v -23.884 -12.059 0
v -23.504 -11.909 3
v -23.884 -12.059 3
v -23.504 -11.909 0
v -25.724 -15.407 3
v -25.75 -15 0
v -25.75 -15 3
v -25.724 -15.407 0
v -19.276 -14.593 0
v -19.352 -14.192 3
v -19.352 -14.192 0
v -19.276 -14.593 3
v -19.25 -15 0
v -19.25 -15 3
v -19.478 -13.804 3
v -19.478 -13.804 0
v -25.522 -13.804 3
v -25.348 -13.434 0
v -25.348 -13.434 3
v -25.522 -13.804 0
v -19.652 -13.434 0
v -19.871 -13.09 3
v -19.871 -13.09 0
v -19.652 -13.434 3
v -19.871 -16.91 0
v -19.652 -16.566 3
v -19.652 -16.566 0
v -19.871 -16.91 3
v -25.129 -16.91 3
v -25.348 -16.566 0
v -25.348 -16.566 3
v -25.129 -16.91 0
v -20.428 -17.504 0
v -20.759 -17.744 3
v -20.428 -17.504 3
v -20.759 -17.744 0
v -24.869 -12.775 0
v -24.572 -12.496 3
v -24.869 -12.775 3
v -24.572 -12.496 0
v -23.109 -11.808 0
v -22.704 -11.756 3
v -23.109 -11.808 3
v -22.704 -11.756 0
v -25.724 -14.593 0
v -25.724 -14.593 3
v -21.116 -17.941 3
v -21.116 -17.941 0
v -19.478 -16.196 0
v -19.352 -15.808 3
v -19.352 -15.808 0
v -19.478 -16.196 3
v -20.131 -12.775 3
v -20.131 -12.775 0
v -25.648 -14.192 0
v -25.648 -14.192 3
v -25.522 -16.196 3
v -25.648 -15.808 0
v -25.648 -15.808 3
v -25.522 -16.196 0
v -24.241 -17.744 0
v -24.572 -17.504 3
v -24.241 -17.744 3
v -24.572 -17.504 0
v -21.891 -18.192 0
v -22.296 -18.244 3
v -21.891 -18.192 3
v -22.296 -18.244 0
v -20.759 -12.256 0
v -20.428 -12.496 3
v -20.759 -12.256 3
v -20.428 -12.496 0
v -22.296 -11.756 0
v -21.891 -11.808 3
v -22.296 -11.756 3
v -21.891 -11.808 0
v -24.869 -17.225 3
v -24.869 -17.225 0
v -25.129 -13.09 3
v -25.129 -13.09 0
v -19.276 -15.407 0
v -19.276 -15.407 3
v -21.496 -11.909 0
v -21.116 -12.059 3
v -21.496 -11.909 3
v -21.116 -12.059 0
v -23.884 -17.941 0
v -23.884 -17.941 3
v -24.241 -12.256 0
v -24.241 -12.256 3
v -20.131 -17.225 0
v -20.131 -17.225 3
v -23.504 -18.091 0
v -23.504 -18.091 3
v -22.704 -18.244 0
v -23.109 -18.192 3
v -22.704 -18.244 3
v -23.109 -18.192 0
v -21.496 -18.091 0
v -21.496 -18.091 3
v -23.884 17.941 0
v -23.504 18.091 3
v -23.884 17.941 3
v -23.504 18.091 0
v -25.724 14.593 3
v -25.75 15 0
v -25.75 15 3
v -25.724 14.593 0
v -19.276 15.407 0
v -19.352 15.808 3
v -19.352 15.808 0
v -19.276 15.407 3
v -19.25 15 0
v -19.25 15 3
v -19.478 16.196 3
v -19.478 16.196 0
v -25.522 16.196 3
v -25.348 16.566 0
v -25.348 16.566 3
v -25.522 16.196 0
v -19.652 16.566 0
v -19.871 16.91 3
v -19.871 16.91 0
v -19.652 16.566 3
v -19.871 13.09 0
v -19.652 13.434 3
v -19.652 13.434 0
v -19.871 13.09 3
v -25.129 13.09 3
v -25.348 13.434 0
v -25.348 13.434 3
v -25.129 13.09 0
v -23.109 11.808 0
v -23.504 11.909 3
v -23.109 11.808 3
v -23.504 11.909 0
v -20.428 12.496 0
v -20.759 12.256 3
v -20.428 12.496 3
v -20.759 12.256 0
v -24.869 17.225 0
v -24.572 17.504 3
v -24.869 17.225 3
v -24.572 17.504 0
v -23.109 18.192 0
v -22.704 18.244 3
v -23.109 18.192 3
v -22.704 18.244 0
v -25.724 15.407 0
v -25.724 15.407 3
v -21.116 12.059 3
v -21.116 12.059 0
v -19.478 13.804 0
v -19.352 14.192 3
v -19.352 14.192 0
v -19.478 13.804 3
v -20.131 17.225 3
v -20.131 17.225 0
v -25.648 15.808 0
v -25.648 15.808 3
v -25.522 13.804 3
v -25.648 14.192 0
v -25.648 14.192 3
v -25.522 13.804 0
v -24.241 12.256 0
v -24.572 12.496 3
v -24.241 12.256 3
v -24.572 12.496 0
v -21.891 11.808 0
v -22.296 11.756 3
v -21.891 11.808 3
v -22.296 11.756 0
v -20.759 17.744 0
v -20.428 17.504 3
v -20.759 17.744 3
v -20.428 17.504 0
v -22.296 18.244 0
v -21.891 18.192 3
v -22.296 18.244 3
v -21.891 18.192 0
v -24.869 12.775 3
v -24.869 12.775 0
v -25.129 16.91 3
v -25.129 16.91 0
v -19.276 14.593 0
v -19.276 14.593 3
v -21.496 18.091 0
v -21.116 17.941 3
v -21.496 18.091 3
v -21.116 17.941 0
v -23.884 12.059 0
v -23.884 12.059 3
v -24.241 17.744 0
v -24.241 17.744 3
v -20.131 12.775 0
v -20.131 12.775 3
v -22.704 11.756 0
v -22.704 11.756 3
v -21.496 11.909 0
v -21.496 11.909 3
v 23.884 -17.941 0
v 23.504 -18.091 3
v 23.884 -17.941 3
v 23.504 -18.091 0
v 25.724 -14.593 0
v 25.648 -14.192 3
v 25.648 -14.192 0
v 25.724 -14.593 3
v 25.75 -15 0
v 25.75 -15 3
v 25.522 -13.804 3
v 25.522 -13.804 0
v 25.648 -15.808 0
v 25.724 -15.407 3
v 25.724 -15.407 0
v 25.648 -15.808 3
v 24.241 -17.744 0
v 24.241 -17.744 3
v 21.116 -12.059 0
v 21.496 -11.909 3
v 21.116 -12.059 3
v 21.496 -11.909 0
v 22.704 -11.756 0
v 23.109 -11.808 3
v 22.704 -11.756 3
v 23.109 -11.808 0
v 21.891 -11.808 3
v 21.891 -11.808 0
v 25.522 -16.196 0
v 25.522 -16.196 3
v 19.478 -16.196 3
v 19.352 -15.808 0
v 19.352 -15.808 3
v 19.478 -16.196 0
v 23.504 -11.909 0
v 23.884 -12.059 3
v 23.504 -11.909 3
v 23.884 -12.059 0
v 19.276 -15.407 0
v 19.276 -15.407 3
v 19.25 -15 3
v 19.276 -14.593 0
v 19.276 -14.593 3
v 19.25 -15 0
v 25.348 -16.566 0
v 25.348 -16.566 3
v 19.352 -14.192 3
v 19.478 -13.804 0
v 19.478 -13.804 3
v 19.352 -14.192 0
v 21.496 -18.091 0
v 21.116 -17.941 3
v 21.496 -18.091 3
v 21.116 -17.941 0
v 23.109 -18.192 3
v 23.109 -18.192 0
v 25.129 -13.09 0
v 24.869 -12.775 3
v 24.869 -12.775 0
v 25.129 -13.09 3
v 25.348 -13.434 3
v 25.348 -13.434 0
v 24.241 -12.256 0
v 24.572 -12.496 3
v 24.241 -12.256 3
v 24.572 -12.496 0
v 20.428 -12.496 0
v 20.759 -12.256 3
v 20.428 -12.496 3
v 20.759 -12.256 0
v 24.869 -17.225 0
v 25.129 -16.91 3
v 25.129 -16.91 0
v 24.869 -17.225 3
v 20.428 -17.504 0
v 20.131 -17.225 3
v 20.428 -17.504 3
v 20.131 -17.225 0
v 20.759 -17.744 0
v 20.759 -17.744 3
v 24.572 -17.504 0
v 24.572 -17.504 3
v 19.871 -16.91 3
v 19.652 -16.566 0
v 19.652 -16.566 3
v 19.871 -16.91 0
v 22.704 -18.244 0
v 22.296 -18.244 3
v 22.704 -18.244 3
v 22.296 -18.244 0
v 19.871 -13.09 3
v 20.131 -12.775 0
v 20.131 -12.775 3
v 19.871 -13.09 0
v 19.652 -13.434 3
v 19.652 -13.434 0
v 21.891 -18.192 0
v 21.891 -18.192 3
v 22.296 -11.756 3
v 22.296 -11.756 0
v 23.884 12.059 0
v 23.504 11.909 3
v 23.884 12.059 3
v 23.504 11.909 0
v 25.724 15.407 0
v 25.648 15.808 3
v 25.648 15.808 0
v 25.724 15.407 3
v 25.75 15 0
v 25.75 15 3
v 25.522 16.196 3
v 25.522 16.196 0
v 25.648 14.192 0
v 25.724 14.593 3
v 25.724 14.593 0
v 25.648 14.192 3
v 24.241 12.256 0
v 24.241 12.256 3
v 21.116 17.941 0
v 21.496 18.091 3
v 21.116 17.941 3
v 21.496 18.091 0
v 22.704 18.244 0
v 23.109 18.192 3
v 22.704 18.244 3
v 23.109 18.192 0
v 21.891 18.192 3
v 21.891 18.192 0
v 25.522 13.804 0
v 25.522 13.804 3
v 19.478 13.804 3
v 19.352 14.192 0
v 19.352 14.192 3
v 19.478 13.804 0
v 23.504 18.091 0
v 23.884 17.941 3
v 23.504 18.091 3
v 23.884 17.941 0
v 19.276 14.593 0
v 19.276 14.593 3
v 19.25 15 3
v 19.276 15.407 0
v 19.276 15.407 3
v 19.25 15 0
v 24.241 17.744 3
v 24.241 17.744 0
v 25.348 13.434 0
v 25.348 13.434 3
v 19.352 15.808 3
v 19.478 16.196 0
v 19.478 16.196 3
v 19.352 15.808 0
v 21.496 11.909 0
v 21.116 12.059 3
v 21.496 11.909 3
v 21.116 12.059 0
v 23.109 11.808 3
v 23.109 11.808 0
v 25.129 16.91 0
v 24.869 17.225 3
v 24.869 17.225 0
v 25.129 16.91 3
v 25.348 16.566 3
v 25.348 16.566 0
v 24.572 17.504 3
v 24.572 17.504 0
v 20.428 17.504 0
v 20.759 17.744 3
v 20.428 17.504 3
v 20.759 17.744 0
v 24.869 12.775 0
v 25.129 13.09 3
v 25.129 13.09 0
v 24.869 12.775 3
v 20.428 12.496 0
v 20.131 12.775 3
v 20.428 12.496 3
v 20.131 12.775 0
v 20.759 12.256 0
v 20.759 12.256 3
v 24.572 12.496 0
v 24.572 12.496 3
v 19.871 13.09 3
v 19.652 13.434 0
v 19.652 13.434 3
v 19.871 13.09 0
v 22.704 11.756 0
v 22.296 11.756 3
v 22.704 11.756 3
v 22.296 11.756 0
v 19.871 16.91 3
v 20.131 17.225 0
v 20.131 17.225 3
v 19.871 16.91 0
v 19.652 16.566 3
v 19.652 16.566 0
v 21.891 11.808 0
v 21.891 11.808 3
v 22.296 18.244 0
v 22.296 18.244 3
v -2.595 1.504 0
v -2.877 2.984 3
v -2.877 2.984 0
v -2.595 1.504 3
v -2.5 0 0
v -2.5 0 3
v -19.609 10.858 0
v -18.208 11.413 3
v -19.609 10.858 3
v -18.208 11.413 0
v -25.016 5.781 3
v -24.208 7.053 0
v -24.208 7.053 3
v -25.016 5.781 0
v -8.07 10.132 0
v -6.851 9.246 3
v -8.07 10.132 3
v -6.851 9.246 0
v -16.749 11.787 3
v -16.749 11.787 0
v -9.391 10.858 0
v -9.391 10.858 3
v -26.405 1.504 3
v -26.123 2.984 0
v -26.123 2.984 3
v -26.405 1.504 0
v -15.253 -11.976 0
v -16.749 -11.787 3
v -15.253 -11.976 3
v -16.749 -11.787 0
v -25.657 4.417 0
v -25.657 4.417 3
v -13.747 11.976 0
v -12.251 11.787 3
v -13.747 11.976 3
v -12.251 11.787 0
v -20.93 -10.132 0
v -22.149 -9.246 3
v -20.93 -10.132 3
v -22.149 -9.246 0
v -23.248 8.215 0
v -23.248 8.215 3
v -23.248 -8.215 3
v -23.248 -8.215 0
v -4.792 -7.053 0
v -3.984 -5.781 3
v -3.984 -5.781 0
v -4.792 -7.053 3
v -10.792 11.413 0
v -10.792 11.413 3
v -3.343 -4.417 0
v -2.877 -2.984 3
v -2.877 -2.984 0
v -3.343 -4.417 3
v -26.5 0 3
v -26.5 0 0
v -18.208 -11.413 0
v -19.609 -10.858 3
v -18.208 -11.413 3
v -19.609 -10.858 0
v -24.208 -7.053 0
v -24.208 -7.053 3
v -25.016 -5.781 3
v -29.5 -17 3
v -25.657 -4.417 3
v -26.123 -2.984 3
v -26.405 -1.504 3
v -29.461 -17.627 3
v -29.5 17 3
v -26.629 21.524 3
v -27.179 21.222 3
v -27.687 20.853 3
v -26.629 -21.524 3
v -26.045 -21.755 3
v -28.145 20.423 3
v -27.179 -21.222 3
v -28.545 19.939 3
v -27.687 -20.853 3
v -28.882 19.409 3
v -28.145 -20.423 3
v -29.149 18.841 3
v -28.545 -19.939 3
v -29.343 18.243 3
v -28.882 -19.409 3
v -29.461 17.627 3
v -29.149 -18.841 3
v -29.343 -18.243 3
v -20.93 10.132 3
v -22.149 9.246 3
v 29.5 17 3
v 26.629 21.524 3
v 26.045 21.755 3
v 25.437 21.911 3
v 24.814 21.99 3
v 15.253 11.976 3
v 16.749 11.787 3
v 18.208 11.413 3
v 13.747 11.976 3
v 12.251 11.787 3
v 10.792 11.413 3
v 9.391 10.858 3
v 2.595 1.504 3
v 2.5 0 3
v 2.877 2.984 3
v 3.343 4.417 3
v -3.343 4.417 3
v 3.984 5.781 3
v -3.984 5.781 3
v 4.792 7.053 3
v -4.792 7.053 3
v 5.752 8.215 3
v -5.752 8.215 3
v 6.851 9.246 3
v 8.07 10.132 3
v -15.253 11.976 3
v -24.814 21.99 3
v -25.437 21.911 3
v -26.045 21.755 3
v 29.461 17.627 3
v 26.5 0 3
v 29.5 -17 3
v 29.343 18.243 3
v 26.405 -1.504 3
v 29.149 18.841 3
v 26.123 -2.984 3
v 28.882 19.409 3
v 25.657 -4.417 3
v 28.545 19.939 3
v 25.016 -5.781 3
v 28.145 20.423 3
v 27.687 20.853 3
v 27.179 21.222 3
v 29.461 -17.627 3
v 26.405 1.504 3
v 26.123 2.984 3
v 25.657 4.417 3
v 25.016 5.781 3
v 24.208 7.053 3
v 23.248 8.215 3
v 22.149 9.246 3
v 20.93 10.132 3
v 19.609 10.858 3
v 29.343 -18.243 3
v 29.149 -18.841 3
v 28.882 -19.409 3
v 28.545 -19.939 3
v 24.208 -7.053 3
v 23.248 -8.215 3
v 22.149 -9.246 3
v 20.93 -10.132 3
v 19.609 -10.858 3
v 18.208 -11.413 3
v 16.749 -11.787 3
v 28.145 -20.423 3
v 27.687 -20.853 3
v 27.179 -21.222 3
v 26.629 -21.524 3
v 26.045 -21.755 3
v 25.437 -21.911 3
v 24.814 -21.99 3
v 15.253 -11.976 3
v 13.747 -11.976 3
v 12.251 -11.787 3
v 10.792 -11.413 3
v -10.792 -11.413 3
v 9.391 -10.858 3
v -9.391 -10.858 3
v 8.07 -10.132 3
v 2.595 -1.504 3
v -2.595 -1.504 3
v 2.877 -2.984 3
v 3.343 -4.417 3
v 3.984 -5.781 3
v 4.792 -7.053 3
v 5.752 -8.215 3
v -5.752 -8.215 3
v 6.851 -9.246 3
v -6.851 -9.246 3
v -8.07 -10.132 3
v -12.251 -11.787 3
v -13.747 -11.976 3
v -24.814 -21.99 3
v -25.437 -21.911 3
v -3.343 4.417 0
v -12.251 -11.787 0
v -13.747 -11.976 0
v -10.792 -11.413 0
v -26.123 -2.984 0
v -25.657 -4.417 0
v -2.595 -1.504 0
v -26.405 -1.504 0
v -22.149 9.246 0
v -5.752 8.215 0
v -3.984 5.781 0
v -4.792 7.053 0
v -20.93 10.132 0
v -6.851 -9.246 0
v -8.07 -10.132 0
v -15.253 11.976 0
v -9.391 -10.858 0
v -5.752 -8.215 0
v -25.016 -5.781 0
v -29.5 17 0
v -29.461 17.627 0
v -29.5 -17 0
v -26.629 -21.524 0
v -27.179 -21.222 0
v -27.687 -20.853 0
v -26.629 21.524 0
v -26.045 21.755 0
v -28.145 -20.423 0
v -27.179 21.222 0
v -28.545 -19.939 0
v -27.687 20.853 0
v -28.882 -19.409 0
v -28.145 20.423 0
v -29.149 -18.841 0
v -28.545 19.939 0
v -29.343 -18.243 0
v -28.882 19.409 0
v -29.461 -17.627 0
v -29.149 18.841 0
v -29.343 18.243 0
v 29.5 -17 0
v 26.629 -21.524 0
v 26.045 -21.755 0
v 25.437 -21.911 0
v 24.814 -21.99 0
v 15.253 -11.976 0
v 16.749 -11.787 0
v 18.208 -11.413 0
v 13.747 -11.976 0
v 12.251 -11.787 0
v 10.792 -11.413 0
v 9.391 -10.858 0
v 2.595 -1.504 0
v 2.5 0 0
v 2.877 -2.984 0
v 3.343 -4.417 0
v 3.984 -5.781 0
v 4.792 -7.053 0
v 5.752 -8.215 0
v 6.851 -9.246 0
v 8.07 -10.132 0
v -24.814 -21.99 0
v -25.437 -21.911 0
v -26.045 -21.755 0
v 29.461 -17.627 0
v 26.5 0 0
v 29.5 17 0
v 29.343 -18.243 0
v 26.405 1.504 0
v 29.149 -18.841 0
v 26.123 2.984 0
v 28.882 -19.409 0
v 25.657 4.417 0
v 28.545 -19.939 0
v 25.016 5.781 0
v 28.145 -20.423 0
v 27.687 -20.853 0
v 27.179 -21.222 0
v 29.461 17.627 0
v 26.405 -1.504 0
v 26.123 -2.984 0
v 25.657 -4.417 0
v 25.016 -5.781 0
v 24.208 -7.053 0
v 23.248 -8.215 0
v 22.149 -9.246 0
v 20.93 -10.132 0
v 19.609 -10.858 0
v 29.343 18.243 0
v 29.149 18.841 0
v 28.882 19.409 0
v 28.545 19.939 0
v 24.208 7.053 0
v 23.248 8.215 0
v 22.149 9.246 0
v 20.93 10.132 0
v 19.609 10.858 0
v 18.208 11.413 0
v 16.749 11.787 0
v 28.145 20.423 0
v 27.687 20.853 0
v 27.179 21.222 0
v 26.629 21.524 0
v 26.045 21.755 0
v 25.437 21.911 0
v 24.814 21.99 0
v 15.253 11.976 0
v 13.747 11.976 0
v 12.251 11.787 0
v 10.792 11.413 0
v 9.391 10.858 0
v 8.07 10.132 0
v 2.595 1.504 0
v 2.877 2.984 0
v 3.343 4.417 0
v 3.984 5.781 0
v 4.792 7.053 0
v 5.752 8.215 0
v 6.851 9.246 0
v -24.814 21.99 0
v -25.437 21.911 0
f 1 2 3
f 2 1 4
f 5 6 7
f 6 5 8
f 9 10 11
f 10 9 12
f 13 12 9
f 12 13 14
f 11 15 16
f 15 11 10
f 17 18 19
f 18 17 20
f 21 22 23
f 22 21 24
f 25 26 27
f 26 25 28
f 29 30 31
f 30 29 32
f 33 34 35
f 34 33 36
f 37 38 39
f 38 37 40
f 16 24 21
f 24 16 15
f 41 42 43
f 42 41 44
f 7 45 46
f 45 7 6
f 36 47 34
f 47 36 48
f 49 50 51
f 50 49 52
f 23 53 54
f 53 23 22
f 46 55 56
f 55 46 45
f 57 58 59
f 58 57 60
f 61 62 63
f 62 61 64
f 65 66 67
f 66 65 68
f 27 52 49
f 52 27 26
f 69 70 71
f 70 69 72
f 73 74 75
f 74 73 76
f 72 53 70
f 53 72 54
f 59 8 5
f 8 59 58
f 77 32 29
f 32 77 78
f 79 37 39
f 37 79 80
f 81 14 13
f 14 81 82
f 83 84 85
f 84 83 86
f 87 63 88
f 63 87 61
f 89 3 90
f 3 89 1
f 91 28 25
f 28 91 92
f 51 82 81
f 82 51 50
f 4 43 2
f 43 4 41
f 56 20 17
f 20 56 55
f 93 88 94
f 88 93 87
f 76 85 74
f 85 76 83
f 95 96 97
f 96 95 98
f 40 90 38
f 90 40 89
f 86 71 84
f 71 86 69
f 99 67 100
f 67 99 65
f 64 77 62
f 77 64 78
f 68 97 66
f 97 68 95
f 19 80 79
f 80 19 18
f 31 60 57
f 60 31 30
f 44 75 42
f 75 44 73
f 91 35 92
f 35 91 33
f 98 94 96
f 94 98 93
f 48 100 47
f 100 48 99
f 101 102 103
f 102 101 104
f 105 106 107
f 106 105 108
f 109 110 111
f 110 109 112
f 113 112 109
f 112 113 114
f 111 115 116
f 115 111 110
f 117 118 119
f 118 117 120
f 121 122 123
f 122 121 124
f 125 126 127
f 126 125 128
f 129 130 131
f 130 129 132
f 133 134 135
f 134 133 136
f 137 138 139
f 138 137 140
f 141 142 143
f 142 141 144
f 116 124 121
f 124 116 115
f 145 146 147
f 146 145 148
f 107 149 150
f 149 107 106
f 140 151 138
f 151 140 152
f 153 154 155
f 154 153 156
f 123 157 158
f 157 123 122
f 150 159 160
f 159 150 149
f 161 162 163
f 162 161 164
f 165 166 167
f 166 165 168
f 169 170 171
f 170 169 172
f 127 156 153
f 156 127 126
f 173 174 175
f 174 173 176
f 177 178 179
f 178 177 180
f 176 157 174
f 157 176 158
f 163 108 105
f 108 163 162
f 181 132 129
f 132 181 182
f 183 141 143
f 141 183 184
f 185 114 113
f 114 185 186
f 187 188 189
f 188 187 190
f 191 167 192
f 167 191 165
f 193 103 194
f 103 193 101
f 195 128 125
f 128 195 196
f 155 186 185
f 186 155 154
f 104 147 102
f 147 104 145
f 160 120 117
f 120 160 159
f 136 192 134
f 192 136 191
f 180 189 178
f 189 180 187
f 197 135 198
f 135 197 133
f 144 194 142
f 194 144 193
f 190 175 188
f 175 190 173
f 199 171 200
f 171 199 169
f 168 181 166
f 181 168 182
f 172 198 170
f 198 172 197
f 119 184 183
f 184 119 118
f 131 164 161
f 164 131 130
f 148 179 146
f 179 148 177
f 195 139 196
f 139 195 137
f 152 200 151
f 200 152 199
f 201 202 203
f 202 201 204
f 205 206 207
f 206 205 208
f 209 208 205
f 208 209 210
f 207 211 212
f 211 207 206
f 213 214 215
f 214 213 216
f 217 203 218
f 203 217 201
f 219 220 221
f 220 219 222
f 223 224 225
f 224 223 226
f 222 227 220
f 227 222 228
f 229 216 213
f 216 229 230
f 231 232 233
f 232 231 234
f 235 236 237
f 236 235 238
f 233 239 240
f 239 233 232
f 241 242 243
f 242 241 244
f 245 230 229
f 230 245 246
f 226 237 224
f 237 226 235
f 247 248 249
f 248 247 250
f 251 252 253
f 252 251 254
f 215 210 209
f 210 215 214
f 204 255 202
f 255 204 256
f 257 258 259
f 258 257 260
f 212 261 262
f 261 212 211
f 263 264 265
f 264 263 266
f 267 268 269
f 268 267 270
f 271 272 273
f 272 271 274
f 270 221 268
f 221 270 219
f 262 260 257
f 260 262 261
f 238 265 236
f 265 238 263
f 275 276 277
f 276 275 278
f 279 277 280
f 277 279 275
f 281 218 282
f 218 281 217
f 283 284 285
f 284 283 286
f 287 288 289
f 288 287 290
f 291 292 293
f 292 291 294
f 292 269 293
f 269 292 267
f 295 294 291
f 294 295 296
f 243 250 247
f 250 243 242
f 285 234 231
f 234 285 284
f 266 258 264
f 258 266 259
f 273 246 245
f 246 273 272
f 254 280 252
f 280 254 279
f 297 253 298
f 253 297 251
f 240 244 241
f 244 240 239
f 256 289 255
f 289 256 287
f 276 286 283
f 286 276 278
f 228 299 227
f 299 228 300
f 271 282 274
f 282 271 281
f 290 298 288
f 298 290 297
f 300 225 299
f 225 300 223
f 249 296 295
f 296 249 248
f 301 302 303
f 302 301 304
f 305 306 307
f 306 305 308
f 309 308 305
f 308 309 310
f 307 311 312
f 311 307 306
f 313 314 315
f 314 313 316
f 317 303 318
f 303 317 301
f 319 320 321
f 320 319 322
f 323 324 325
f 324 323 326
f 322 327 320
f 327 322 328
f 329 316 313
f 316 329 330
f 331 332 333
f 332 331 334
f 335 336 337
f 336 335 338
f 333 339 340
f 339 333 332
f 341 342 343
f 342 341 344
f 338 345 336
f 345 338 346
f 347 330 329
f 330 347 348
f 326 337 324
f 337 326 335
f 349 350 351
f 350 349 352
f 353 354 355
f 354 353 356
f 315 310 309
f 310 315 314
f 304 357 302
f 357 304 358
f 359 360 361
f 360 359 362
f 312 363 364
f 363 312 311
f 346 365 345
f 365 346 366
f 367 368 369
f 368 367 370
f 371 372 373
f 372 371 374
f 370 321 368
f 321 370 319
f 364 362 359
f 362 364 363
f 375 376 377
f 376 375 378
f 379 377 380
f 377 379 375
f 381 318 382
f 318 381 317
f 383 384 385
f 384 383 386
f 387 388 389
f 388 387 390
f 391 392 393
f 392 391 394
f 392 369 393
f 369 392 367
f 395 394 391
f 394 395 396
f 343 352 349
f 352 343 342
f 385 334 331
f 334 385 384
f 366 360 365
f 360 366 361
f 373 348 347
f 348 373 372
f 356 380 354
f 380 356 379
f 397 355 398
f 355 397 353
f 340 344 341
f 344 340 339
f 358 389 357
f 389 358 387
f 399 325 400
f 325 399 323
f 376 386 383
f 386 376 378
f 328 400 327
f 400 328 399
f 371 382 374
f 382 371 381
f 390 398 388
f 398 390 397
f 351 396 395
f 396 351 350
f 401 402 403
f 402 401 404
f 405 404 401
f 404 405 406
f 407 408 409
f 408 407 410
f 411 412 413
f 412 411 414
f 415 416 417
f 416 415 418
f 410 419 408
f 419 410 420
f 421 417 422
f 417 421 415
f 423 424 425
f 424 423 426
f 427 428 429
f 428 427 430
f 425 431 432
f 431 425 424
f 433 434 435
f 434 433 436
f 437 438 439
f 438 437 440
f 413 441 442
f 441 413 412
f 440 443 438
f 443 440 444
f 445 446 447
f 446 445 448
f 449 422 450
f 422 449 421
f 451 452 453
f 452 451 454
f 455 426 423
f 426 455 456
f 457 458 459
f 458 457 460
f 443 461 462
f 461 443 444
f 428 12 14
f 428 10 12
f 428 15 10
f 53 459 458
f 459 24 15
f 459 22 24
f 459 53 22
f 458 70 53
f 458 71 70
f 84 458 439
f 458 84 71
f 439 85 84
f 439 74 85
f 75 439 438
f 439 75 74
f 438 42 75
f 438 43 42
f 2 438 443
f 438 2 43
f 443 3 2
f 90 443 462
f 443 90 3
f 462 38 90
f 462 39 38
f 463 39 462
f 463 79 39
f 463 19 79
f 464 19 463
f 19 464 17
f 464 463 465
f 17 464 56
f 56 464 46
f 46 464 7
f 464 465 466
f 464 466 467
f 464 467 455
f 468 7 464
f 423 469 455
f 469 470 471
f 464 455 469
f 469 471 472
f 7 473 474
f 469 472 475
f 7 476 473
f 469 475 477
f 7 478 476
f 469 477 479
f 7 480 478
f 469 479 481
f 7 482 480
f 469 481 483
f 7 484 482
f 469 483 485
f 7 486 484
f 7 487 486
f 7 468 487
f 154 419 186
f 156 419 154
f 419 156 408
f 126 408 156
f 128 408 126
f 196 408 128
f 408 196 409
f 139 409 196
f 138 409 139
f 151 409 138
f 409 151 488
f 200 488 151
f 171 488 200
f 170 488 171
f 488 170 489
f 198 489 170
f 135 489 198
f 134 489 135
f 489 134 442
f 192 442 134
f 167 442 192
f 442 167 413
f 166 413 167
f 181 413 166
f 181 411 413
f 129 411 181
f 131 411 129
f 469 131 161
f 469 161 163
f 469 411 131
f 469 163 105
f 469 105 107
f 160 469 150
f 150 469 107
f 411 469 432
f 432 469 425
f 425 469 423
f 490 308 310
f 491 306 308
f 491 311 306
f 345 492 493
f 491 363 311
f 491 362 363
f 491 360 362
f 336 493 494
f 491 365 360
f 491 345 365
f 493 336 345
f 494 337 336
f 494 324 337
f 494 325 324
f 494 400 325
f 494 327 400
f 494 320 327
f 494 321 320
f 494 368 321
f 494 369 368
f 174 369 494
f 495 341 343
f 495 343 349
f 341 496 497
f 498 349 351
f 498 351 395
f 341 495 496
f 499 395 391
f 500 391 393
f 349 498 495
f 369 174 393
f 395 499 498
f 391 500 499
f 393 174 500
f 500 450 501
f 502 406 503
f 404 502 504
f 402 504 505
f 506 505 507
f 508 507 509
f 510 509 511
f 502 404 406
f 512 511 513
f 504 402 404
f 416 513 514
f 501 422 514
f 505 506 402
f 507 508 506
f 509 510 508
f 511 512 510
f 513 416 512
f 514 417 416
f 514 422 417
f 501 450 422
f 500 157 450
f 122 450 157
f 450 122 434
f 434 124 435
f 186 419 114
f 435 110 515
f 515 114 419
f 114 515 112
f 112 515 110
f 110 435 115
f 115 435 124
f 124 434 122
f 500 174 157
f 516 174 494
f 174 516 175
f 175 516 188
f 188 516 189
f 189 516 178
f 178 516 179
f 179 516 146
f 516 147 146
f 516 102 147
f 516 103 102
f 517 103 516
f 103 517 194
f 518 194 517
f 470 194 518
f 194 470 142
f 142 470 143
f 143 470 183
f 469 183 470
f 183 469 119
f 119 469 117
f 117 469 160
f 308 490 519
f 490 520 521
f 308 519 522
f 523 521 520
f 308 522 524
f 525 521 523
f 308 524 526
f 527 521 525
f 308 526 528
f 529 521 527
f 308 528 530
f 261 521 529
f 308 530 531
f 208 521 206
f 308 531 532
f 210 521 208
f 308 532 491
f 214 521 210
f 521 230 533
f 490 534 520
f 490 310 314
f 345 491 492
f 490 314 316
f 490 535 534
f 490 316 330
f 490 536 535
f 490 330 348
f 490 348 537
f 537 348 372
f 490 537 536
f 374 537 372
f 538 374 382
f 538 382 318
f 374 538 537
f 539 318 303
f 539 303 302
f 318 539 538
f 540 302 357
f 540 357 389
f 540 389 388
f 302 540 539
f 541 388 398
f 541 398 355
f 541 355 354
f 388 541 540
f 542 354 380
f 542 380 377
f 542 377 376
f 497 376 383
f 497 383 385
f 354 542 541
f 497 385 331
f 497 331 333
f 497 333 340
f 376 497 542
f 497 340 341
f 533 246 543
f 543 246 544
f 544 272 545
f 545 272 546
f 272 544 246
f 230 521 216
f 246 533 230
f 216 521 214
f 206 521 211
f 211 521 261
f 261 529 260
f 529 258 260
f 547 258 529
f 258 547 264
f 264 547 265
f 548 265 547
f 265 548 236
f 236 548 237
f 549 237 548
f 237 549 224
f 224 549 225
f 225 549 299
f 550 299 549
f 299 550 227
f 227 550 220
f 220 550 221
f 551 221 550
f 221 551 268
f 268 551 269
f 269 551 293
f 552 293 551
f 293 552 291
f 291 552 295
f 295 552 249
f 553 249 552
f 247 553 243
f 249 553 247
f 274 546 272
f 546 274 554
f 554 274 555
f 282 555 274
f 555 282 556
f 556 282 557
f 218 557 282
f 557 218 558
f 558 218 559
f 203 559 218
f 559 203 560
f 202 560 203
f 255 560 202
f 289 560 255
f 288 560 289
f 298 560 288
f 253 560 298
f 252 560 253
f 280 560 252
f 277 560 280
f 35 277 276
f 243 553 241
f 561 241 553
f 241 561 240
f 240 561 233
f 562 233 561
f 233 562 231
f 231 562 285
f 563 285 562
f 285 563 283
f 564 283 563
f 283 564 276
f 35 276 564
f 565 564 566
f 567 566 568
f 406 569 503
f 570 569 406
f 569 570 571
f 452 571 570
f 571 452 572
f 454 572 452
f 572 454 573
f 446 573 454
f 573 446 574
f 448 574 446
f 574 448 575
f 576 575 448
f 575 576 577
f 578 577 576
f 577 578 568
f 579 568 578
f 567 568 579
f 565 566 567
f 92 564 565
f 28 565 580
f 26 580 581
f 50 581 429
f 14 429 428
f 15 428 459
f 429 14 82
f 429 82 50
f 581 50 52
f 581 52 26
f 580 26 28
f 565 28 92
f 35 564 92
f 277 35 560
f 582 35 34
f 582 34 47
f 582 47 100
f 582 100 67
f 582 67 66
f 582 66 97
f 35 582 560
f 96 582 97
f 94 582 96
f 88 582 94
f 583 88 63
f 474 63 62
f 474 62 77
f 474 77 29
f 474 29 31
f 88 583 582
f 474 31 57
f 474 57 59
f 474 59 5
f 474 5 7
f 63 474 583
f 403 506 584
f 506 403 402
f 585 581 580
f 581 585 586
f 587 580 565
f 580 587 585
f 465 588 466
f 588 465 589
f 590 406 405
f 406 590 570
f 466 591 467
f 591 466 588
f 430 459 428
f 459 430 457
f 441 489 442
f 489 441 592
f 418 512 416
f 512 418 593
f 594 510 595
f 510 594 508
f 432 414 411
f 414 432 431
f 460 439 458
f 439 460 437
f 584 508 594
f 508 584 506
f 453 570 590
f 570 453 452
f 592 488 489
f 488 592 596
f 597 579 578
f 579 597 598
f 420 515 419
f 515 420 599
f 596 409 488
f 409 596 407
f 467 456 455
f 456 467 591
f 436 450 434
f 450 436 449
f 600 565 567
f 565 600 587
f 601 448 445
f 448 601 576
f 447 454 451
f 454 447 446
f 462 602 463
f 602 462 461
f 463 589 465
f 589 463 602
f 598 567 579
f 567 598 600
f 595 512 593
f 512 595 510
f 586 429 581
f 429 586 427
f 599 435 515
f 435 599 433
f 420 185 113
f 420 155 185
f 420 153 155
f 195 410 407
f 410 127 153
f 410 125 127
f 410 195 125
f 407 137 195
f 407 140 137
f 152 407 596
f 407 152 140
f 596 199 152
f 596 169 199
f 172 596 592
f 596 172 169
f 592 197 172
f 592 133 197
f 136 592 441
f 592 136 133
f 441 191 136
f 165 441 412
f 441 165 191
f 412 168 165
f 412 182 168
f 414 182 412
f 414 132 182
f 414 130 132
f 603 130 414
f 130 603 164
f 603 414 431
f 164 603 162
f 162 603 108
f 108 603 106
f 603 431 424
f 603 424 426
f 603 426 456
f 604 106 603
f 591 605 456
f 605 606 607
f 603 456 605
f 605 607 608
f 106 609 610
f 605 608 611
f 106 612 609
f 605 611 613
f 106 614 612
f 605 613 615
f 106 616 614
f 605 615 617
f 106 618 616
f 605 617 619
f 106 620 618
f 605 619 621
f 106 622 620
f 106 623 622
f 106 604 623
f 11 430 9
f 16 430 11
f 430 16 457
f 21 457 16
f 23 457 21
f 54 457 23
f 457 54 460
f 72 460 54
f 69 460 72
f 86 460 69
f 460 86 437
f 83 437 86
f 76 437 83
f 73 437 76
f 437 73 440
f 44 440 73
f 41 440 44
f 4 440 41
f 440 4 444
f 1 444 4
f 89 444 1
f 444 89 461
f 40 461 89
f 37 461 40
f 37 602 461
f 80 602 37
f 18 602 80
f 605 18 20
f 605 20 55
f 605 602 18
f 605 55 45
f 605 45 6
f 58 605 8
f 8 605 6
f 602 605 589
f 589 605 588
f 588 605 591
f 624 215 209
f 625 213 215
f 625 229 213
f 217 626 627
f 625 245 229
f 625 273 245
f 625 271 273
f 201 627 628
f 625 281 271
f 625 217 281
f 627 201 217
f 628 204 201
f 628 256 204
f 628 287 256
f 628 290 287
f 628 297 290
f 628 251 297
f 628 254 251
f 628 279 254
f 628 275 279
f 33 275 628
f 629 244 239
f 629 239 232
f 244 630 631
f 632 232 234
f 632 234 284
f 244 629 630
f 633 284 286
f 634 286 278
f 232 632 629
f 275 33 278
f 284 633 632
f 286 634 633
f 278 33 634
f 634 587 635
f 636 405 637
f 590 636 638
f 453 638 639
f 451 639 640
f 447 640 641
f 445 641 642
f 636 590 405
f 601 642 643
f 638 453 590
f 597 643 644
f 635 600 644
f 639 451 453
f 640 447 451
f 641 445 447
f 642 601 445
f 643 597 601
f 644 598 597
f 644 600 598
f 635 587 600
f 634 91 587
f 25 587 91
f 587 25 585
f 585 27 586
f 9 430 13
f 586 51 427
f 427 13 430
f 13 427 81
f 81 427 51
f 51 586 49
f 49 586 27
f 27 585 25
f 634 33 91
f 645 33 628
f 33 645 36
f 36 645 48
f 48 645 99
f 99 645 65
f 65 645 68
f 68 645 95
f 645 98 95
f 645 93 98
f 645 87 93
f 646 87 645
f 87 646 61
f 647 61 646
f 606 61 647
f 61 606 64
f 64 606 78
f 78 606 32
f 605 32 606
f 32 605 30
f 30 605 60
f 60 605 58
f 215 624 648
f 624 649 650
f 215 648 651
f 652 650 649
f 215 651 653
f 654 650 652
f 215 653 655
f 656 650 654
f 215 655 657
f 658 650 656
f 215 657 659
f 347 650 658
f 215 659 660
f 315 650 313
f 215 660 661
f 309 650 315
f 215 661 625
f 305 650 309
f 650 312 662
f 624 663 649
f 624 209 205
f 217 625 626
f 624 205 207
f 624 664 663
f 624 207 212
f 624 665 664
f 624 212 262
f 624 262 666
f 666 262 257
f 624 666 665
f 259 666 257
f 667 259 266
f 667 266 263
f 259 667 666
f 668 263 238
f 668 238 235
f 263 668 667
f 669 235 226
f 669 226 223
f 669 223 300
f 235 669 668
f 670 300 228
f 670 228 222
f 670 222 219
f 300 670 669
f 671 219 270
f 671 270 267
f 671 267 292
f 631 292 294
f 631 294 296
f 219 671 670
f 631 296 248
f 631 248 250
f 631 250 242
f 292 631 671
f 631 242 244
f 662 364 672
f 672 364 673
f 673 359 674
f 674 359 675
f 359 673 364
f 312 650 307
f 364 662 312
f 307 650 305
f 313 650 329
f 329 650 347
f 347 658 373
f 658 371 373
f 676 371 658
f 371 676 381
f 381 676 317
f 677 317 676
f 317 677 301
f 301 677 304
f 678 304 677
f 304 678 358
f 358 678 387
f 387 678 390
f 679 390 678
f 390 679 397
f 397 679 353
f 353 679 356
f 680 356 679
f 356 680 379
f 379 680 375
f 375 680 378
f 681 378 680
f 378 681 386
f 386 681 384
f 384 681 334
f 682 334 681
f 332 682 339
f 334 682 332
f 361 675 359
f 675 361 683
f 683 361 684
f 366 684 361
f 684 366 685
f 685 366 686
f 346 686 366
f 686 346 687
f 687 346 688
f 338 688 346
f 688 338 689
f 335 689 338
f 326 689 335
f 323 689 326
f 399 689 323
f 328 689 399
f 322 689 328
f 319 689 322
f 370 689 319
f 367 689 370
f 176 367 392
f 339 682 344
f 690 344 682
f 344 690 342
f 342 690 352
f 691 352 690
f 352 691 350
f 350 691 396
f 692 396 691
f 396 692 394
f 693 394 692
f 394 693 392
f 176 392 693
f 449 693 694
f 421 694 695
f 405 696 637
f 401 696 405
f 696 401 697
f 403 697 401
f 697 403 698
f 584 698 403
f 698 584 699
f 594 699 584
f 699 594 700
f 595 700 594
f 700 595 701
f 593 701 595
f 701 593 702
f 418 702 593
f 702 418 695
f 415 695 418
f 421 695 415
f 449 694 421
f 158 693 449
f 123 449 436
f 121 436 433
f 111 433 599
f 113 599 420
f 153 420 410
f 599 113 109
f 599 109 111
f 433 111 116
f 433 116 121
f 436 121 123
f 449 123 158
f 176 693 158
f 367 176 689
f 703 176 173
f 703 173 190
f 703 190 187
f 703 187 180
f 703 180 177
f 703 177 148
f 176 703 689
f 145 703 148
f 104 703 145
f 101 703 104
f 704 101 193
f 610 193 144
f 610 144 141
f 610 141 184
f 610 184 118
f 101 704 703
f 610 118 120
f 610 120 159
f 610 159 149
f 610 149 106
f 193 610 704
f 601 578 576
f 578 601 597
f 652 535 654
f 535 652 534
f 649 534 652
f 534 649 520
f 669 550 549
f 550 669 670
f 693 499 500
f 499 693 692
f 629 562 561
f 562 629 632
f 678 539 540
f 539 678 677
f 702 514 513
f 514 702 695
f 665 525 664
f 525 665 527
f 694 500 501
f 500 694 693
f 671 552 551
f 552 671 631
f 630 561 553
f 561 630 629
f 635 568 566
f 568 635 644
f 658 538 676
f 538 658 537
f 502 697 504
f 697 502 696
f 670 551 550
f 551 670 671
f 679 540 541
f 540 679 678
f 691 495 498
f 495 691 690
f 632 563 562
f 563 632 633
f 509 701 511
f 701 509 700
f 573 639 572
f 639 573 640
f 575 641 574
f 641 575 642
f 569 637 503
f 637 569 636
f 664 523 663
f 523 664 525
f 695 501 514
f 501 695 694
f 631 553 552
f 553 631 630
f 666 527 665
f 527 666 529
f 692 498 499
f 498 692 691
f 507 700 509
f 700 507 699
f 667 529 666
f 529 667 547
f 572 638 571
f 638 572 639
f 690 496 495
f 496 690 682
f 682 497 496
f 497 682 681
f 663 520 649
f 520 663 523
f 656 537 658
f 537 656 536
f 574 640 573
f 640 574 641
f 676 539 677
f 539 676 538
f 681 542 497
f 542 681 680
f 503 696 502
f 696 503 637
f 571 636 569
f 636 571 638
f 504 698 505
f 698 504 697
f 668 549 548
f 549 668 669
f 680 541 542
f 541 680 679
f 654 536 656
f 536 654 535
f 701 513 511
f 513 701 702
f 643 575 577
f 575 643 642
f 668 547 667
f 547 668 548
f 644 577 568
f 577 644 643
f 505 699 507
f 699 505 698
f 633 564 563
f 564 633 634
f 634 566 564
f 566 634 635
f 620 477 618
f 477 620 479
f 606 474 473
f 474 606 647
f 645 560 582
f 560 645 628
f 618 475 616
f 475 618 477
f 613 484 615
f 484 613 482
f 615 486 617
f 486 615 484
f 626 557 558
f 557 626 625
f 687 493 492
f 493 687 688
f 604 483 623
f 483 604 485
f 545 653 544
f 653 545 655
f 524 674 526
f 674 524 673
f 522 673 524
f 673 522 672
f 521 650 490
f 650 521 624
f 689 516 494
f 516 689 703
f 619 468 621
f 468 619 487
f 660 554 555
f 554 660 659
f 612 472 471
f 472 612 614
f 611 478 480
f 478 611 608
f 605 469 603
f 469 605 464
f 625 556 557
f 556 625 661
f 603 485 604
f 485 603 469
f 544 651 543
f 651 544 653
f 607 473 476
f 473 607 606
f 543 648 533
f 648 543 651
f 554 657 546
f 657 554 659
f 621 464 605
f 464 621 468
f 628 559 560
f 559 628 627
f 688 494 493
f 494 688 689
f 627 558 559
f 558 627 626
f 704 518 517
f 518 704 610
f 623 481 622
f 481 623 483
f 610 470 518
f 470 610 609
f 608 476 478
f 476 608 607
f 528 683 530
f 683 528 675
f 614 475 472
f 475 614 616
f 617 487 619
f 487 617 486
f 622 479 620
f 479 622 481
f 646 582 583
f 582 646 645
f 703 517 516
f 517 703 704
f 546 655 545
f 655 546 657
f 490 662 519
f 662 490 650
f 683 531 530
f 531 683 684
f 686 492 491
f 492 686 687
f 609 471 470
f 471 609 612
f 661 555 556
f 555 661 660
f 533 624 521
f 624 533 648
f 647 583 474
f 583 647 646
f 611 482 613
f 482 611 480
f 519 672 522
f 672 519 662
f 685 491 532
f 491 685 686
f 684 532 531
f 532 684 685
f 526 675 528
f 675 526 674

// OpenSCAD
$fn = 50;

difference() {
	union() {
		hull() {
			translate(v = [-24.5, 17.0, 0]) {
				cylinder(h = 3, r = 5);
			}
			translate(v = [24.5, 17.0, 0]) {
				cylinder(h = 3, r = 5);
			}
			translate(v = [-24.5, -17.0, 0]) {
				cylinder(h = 3, r = 5);
			}
			translate(v = [24.5, -17.0, 0]) {
				cylinder(h = 3, r = 5);
			}
		}
	}
	union() {
		translate(v = [-22.5, -15.0, -100.0]) {
			cylinder(h = 200, r = 3.25);
		}
		translate(v = [-22.5, 15.0, -100.0]) {
			cylinder(h = 200, r = 3.25);
		}
		translate(v = [22.5, -15.0, -100.0]) {
			cylinder(h = 200, r = 3.25);
		}
		translate(v = [22.5, 15.0, -100.0]) {
			cylinder(h = 200, r = 3.25);
		}
		translate(v = [-22.5, -15.0, -100.0]) {
			cylinder(h = 200, r = 1.8);
		}
		translate(v = [-22.5, 15.0, -100.0]) {
			cylinder(h = 200, r = 1.8);
		}
		translate(v = [22.5, -15.0, -100.0]) {
			cylinder(h = 200, r = 1.8);
		}
		translate(v = [22.5, 15.0, -100.0]) {
			cylinder(h = 200, r = 1.8);
		}
		translate(v = [-14.5, 0, 0.0]) {
			cylinder(h = 3, r = 12.0);
		}
		translate(v = [14.5, 0, 0.0]) {
			cylinder(h = 3, r = 12.0);
		}
	}
}
